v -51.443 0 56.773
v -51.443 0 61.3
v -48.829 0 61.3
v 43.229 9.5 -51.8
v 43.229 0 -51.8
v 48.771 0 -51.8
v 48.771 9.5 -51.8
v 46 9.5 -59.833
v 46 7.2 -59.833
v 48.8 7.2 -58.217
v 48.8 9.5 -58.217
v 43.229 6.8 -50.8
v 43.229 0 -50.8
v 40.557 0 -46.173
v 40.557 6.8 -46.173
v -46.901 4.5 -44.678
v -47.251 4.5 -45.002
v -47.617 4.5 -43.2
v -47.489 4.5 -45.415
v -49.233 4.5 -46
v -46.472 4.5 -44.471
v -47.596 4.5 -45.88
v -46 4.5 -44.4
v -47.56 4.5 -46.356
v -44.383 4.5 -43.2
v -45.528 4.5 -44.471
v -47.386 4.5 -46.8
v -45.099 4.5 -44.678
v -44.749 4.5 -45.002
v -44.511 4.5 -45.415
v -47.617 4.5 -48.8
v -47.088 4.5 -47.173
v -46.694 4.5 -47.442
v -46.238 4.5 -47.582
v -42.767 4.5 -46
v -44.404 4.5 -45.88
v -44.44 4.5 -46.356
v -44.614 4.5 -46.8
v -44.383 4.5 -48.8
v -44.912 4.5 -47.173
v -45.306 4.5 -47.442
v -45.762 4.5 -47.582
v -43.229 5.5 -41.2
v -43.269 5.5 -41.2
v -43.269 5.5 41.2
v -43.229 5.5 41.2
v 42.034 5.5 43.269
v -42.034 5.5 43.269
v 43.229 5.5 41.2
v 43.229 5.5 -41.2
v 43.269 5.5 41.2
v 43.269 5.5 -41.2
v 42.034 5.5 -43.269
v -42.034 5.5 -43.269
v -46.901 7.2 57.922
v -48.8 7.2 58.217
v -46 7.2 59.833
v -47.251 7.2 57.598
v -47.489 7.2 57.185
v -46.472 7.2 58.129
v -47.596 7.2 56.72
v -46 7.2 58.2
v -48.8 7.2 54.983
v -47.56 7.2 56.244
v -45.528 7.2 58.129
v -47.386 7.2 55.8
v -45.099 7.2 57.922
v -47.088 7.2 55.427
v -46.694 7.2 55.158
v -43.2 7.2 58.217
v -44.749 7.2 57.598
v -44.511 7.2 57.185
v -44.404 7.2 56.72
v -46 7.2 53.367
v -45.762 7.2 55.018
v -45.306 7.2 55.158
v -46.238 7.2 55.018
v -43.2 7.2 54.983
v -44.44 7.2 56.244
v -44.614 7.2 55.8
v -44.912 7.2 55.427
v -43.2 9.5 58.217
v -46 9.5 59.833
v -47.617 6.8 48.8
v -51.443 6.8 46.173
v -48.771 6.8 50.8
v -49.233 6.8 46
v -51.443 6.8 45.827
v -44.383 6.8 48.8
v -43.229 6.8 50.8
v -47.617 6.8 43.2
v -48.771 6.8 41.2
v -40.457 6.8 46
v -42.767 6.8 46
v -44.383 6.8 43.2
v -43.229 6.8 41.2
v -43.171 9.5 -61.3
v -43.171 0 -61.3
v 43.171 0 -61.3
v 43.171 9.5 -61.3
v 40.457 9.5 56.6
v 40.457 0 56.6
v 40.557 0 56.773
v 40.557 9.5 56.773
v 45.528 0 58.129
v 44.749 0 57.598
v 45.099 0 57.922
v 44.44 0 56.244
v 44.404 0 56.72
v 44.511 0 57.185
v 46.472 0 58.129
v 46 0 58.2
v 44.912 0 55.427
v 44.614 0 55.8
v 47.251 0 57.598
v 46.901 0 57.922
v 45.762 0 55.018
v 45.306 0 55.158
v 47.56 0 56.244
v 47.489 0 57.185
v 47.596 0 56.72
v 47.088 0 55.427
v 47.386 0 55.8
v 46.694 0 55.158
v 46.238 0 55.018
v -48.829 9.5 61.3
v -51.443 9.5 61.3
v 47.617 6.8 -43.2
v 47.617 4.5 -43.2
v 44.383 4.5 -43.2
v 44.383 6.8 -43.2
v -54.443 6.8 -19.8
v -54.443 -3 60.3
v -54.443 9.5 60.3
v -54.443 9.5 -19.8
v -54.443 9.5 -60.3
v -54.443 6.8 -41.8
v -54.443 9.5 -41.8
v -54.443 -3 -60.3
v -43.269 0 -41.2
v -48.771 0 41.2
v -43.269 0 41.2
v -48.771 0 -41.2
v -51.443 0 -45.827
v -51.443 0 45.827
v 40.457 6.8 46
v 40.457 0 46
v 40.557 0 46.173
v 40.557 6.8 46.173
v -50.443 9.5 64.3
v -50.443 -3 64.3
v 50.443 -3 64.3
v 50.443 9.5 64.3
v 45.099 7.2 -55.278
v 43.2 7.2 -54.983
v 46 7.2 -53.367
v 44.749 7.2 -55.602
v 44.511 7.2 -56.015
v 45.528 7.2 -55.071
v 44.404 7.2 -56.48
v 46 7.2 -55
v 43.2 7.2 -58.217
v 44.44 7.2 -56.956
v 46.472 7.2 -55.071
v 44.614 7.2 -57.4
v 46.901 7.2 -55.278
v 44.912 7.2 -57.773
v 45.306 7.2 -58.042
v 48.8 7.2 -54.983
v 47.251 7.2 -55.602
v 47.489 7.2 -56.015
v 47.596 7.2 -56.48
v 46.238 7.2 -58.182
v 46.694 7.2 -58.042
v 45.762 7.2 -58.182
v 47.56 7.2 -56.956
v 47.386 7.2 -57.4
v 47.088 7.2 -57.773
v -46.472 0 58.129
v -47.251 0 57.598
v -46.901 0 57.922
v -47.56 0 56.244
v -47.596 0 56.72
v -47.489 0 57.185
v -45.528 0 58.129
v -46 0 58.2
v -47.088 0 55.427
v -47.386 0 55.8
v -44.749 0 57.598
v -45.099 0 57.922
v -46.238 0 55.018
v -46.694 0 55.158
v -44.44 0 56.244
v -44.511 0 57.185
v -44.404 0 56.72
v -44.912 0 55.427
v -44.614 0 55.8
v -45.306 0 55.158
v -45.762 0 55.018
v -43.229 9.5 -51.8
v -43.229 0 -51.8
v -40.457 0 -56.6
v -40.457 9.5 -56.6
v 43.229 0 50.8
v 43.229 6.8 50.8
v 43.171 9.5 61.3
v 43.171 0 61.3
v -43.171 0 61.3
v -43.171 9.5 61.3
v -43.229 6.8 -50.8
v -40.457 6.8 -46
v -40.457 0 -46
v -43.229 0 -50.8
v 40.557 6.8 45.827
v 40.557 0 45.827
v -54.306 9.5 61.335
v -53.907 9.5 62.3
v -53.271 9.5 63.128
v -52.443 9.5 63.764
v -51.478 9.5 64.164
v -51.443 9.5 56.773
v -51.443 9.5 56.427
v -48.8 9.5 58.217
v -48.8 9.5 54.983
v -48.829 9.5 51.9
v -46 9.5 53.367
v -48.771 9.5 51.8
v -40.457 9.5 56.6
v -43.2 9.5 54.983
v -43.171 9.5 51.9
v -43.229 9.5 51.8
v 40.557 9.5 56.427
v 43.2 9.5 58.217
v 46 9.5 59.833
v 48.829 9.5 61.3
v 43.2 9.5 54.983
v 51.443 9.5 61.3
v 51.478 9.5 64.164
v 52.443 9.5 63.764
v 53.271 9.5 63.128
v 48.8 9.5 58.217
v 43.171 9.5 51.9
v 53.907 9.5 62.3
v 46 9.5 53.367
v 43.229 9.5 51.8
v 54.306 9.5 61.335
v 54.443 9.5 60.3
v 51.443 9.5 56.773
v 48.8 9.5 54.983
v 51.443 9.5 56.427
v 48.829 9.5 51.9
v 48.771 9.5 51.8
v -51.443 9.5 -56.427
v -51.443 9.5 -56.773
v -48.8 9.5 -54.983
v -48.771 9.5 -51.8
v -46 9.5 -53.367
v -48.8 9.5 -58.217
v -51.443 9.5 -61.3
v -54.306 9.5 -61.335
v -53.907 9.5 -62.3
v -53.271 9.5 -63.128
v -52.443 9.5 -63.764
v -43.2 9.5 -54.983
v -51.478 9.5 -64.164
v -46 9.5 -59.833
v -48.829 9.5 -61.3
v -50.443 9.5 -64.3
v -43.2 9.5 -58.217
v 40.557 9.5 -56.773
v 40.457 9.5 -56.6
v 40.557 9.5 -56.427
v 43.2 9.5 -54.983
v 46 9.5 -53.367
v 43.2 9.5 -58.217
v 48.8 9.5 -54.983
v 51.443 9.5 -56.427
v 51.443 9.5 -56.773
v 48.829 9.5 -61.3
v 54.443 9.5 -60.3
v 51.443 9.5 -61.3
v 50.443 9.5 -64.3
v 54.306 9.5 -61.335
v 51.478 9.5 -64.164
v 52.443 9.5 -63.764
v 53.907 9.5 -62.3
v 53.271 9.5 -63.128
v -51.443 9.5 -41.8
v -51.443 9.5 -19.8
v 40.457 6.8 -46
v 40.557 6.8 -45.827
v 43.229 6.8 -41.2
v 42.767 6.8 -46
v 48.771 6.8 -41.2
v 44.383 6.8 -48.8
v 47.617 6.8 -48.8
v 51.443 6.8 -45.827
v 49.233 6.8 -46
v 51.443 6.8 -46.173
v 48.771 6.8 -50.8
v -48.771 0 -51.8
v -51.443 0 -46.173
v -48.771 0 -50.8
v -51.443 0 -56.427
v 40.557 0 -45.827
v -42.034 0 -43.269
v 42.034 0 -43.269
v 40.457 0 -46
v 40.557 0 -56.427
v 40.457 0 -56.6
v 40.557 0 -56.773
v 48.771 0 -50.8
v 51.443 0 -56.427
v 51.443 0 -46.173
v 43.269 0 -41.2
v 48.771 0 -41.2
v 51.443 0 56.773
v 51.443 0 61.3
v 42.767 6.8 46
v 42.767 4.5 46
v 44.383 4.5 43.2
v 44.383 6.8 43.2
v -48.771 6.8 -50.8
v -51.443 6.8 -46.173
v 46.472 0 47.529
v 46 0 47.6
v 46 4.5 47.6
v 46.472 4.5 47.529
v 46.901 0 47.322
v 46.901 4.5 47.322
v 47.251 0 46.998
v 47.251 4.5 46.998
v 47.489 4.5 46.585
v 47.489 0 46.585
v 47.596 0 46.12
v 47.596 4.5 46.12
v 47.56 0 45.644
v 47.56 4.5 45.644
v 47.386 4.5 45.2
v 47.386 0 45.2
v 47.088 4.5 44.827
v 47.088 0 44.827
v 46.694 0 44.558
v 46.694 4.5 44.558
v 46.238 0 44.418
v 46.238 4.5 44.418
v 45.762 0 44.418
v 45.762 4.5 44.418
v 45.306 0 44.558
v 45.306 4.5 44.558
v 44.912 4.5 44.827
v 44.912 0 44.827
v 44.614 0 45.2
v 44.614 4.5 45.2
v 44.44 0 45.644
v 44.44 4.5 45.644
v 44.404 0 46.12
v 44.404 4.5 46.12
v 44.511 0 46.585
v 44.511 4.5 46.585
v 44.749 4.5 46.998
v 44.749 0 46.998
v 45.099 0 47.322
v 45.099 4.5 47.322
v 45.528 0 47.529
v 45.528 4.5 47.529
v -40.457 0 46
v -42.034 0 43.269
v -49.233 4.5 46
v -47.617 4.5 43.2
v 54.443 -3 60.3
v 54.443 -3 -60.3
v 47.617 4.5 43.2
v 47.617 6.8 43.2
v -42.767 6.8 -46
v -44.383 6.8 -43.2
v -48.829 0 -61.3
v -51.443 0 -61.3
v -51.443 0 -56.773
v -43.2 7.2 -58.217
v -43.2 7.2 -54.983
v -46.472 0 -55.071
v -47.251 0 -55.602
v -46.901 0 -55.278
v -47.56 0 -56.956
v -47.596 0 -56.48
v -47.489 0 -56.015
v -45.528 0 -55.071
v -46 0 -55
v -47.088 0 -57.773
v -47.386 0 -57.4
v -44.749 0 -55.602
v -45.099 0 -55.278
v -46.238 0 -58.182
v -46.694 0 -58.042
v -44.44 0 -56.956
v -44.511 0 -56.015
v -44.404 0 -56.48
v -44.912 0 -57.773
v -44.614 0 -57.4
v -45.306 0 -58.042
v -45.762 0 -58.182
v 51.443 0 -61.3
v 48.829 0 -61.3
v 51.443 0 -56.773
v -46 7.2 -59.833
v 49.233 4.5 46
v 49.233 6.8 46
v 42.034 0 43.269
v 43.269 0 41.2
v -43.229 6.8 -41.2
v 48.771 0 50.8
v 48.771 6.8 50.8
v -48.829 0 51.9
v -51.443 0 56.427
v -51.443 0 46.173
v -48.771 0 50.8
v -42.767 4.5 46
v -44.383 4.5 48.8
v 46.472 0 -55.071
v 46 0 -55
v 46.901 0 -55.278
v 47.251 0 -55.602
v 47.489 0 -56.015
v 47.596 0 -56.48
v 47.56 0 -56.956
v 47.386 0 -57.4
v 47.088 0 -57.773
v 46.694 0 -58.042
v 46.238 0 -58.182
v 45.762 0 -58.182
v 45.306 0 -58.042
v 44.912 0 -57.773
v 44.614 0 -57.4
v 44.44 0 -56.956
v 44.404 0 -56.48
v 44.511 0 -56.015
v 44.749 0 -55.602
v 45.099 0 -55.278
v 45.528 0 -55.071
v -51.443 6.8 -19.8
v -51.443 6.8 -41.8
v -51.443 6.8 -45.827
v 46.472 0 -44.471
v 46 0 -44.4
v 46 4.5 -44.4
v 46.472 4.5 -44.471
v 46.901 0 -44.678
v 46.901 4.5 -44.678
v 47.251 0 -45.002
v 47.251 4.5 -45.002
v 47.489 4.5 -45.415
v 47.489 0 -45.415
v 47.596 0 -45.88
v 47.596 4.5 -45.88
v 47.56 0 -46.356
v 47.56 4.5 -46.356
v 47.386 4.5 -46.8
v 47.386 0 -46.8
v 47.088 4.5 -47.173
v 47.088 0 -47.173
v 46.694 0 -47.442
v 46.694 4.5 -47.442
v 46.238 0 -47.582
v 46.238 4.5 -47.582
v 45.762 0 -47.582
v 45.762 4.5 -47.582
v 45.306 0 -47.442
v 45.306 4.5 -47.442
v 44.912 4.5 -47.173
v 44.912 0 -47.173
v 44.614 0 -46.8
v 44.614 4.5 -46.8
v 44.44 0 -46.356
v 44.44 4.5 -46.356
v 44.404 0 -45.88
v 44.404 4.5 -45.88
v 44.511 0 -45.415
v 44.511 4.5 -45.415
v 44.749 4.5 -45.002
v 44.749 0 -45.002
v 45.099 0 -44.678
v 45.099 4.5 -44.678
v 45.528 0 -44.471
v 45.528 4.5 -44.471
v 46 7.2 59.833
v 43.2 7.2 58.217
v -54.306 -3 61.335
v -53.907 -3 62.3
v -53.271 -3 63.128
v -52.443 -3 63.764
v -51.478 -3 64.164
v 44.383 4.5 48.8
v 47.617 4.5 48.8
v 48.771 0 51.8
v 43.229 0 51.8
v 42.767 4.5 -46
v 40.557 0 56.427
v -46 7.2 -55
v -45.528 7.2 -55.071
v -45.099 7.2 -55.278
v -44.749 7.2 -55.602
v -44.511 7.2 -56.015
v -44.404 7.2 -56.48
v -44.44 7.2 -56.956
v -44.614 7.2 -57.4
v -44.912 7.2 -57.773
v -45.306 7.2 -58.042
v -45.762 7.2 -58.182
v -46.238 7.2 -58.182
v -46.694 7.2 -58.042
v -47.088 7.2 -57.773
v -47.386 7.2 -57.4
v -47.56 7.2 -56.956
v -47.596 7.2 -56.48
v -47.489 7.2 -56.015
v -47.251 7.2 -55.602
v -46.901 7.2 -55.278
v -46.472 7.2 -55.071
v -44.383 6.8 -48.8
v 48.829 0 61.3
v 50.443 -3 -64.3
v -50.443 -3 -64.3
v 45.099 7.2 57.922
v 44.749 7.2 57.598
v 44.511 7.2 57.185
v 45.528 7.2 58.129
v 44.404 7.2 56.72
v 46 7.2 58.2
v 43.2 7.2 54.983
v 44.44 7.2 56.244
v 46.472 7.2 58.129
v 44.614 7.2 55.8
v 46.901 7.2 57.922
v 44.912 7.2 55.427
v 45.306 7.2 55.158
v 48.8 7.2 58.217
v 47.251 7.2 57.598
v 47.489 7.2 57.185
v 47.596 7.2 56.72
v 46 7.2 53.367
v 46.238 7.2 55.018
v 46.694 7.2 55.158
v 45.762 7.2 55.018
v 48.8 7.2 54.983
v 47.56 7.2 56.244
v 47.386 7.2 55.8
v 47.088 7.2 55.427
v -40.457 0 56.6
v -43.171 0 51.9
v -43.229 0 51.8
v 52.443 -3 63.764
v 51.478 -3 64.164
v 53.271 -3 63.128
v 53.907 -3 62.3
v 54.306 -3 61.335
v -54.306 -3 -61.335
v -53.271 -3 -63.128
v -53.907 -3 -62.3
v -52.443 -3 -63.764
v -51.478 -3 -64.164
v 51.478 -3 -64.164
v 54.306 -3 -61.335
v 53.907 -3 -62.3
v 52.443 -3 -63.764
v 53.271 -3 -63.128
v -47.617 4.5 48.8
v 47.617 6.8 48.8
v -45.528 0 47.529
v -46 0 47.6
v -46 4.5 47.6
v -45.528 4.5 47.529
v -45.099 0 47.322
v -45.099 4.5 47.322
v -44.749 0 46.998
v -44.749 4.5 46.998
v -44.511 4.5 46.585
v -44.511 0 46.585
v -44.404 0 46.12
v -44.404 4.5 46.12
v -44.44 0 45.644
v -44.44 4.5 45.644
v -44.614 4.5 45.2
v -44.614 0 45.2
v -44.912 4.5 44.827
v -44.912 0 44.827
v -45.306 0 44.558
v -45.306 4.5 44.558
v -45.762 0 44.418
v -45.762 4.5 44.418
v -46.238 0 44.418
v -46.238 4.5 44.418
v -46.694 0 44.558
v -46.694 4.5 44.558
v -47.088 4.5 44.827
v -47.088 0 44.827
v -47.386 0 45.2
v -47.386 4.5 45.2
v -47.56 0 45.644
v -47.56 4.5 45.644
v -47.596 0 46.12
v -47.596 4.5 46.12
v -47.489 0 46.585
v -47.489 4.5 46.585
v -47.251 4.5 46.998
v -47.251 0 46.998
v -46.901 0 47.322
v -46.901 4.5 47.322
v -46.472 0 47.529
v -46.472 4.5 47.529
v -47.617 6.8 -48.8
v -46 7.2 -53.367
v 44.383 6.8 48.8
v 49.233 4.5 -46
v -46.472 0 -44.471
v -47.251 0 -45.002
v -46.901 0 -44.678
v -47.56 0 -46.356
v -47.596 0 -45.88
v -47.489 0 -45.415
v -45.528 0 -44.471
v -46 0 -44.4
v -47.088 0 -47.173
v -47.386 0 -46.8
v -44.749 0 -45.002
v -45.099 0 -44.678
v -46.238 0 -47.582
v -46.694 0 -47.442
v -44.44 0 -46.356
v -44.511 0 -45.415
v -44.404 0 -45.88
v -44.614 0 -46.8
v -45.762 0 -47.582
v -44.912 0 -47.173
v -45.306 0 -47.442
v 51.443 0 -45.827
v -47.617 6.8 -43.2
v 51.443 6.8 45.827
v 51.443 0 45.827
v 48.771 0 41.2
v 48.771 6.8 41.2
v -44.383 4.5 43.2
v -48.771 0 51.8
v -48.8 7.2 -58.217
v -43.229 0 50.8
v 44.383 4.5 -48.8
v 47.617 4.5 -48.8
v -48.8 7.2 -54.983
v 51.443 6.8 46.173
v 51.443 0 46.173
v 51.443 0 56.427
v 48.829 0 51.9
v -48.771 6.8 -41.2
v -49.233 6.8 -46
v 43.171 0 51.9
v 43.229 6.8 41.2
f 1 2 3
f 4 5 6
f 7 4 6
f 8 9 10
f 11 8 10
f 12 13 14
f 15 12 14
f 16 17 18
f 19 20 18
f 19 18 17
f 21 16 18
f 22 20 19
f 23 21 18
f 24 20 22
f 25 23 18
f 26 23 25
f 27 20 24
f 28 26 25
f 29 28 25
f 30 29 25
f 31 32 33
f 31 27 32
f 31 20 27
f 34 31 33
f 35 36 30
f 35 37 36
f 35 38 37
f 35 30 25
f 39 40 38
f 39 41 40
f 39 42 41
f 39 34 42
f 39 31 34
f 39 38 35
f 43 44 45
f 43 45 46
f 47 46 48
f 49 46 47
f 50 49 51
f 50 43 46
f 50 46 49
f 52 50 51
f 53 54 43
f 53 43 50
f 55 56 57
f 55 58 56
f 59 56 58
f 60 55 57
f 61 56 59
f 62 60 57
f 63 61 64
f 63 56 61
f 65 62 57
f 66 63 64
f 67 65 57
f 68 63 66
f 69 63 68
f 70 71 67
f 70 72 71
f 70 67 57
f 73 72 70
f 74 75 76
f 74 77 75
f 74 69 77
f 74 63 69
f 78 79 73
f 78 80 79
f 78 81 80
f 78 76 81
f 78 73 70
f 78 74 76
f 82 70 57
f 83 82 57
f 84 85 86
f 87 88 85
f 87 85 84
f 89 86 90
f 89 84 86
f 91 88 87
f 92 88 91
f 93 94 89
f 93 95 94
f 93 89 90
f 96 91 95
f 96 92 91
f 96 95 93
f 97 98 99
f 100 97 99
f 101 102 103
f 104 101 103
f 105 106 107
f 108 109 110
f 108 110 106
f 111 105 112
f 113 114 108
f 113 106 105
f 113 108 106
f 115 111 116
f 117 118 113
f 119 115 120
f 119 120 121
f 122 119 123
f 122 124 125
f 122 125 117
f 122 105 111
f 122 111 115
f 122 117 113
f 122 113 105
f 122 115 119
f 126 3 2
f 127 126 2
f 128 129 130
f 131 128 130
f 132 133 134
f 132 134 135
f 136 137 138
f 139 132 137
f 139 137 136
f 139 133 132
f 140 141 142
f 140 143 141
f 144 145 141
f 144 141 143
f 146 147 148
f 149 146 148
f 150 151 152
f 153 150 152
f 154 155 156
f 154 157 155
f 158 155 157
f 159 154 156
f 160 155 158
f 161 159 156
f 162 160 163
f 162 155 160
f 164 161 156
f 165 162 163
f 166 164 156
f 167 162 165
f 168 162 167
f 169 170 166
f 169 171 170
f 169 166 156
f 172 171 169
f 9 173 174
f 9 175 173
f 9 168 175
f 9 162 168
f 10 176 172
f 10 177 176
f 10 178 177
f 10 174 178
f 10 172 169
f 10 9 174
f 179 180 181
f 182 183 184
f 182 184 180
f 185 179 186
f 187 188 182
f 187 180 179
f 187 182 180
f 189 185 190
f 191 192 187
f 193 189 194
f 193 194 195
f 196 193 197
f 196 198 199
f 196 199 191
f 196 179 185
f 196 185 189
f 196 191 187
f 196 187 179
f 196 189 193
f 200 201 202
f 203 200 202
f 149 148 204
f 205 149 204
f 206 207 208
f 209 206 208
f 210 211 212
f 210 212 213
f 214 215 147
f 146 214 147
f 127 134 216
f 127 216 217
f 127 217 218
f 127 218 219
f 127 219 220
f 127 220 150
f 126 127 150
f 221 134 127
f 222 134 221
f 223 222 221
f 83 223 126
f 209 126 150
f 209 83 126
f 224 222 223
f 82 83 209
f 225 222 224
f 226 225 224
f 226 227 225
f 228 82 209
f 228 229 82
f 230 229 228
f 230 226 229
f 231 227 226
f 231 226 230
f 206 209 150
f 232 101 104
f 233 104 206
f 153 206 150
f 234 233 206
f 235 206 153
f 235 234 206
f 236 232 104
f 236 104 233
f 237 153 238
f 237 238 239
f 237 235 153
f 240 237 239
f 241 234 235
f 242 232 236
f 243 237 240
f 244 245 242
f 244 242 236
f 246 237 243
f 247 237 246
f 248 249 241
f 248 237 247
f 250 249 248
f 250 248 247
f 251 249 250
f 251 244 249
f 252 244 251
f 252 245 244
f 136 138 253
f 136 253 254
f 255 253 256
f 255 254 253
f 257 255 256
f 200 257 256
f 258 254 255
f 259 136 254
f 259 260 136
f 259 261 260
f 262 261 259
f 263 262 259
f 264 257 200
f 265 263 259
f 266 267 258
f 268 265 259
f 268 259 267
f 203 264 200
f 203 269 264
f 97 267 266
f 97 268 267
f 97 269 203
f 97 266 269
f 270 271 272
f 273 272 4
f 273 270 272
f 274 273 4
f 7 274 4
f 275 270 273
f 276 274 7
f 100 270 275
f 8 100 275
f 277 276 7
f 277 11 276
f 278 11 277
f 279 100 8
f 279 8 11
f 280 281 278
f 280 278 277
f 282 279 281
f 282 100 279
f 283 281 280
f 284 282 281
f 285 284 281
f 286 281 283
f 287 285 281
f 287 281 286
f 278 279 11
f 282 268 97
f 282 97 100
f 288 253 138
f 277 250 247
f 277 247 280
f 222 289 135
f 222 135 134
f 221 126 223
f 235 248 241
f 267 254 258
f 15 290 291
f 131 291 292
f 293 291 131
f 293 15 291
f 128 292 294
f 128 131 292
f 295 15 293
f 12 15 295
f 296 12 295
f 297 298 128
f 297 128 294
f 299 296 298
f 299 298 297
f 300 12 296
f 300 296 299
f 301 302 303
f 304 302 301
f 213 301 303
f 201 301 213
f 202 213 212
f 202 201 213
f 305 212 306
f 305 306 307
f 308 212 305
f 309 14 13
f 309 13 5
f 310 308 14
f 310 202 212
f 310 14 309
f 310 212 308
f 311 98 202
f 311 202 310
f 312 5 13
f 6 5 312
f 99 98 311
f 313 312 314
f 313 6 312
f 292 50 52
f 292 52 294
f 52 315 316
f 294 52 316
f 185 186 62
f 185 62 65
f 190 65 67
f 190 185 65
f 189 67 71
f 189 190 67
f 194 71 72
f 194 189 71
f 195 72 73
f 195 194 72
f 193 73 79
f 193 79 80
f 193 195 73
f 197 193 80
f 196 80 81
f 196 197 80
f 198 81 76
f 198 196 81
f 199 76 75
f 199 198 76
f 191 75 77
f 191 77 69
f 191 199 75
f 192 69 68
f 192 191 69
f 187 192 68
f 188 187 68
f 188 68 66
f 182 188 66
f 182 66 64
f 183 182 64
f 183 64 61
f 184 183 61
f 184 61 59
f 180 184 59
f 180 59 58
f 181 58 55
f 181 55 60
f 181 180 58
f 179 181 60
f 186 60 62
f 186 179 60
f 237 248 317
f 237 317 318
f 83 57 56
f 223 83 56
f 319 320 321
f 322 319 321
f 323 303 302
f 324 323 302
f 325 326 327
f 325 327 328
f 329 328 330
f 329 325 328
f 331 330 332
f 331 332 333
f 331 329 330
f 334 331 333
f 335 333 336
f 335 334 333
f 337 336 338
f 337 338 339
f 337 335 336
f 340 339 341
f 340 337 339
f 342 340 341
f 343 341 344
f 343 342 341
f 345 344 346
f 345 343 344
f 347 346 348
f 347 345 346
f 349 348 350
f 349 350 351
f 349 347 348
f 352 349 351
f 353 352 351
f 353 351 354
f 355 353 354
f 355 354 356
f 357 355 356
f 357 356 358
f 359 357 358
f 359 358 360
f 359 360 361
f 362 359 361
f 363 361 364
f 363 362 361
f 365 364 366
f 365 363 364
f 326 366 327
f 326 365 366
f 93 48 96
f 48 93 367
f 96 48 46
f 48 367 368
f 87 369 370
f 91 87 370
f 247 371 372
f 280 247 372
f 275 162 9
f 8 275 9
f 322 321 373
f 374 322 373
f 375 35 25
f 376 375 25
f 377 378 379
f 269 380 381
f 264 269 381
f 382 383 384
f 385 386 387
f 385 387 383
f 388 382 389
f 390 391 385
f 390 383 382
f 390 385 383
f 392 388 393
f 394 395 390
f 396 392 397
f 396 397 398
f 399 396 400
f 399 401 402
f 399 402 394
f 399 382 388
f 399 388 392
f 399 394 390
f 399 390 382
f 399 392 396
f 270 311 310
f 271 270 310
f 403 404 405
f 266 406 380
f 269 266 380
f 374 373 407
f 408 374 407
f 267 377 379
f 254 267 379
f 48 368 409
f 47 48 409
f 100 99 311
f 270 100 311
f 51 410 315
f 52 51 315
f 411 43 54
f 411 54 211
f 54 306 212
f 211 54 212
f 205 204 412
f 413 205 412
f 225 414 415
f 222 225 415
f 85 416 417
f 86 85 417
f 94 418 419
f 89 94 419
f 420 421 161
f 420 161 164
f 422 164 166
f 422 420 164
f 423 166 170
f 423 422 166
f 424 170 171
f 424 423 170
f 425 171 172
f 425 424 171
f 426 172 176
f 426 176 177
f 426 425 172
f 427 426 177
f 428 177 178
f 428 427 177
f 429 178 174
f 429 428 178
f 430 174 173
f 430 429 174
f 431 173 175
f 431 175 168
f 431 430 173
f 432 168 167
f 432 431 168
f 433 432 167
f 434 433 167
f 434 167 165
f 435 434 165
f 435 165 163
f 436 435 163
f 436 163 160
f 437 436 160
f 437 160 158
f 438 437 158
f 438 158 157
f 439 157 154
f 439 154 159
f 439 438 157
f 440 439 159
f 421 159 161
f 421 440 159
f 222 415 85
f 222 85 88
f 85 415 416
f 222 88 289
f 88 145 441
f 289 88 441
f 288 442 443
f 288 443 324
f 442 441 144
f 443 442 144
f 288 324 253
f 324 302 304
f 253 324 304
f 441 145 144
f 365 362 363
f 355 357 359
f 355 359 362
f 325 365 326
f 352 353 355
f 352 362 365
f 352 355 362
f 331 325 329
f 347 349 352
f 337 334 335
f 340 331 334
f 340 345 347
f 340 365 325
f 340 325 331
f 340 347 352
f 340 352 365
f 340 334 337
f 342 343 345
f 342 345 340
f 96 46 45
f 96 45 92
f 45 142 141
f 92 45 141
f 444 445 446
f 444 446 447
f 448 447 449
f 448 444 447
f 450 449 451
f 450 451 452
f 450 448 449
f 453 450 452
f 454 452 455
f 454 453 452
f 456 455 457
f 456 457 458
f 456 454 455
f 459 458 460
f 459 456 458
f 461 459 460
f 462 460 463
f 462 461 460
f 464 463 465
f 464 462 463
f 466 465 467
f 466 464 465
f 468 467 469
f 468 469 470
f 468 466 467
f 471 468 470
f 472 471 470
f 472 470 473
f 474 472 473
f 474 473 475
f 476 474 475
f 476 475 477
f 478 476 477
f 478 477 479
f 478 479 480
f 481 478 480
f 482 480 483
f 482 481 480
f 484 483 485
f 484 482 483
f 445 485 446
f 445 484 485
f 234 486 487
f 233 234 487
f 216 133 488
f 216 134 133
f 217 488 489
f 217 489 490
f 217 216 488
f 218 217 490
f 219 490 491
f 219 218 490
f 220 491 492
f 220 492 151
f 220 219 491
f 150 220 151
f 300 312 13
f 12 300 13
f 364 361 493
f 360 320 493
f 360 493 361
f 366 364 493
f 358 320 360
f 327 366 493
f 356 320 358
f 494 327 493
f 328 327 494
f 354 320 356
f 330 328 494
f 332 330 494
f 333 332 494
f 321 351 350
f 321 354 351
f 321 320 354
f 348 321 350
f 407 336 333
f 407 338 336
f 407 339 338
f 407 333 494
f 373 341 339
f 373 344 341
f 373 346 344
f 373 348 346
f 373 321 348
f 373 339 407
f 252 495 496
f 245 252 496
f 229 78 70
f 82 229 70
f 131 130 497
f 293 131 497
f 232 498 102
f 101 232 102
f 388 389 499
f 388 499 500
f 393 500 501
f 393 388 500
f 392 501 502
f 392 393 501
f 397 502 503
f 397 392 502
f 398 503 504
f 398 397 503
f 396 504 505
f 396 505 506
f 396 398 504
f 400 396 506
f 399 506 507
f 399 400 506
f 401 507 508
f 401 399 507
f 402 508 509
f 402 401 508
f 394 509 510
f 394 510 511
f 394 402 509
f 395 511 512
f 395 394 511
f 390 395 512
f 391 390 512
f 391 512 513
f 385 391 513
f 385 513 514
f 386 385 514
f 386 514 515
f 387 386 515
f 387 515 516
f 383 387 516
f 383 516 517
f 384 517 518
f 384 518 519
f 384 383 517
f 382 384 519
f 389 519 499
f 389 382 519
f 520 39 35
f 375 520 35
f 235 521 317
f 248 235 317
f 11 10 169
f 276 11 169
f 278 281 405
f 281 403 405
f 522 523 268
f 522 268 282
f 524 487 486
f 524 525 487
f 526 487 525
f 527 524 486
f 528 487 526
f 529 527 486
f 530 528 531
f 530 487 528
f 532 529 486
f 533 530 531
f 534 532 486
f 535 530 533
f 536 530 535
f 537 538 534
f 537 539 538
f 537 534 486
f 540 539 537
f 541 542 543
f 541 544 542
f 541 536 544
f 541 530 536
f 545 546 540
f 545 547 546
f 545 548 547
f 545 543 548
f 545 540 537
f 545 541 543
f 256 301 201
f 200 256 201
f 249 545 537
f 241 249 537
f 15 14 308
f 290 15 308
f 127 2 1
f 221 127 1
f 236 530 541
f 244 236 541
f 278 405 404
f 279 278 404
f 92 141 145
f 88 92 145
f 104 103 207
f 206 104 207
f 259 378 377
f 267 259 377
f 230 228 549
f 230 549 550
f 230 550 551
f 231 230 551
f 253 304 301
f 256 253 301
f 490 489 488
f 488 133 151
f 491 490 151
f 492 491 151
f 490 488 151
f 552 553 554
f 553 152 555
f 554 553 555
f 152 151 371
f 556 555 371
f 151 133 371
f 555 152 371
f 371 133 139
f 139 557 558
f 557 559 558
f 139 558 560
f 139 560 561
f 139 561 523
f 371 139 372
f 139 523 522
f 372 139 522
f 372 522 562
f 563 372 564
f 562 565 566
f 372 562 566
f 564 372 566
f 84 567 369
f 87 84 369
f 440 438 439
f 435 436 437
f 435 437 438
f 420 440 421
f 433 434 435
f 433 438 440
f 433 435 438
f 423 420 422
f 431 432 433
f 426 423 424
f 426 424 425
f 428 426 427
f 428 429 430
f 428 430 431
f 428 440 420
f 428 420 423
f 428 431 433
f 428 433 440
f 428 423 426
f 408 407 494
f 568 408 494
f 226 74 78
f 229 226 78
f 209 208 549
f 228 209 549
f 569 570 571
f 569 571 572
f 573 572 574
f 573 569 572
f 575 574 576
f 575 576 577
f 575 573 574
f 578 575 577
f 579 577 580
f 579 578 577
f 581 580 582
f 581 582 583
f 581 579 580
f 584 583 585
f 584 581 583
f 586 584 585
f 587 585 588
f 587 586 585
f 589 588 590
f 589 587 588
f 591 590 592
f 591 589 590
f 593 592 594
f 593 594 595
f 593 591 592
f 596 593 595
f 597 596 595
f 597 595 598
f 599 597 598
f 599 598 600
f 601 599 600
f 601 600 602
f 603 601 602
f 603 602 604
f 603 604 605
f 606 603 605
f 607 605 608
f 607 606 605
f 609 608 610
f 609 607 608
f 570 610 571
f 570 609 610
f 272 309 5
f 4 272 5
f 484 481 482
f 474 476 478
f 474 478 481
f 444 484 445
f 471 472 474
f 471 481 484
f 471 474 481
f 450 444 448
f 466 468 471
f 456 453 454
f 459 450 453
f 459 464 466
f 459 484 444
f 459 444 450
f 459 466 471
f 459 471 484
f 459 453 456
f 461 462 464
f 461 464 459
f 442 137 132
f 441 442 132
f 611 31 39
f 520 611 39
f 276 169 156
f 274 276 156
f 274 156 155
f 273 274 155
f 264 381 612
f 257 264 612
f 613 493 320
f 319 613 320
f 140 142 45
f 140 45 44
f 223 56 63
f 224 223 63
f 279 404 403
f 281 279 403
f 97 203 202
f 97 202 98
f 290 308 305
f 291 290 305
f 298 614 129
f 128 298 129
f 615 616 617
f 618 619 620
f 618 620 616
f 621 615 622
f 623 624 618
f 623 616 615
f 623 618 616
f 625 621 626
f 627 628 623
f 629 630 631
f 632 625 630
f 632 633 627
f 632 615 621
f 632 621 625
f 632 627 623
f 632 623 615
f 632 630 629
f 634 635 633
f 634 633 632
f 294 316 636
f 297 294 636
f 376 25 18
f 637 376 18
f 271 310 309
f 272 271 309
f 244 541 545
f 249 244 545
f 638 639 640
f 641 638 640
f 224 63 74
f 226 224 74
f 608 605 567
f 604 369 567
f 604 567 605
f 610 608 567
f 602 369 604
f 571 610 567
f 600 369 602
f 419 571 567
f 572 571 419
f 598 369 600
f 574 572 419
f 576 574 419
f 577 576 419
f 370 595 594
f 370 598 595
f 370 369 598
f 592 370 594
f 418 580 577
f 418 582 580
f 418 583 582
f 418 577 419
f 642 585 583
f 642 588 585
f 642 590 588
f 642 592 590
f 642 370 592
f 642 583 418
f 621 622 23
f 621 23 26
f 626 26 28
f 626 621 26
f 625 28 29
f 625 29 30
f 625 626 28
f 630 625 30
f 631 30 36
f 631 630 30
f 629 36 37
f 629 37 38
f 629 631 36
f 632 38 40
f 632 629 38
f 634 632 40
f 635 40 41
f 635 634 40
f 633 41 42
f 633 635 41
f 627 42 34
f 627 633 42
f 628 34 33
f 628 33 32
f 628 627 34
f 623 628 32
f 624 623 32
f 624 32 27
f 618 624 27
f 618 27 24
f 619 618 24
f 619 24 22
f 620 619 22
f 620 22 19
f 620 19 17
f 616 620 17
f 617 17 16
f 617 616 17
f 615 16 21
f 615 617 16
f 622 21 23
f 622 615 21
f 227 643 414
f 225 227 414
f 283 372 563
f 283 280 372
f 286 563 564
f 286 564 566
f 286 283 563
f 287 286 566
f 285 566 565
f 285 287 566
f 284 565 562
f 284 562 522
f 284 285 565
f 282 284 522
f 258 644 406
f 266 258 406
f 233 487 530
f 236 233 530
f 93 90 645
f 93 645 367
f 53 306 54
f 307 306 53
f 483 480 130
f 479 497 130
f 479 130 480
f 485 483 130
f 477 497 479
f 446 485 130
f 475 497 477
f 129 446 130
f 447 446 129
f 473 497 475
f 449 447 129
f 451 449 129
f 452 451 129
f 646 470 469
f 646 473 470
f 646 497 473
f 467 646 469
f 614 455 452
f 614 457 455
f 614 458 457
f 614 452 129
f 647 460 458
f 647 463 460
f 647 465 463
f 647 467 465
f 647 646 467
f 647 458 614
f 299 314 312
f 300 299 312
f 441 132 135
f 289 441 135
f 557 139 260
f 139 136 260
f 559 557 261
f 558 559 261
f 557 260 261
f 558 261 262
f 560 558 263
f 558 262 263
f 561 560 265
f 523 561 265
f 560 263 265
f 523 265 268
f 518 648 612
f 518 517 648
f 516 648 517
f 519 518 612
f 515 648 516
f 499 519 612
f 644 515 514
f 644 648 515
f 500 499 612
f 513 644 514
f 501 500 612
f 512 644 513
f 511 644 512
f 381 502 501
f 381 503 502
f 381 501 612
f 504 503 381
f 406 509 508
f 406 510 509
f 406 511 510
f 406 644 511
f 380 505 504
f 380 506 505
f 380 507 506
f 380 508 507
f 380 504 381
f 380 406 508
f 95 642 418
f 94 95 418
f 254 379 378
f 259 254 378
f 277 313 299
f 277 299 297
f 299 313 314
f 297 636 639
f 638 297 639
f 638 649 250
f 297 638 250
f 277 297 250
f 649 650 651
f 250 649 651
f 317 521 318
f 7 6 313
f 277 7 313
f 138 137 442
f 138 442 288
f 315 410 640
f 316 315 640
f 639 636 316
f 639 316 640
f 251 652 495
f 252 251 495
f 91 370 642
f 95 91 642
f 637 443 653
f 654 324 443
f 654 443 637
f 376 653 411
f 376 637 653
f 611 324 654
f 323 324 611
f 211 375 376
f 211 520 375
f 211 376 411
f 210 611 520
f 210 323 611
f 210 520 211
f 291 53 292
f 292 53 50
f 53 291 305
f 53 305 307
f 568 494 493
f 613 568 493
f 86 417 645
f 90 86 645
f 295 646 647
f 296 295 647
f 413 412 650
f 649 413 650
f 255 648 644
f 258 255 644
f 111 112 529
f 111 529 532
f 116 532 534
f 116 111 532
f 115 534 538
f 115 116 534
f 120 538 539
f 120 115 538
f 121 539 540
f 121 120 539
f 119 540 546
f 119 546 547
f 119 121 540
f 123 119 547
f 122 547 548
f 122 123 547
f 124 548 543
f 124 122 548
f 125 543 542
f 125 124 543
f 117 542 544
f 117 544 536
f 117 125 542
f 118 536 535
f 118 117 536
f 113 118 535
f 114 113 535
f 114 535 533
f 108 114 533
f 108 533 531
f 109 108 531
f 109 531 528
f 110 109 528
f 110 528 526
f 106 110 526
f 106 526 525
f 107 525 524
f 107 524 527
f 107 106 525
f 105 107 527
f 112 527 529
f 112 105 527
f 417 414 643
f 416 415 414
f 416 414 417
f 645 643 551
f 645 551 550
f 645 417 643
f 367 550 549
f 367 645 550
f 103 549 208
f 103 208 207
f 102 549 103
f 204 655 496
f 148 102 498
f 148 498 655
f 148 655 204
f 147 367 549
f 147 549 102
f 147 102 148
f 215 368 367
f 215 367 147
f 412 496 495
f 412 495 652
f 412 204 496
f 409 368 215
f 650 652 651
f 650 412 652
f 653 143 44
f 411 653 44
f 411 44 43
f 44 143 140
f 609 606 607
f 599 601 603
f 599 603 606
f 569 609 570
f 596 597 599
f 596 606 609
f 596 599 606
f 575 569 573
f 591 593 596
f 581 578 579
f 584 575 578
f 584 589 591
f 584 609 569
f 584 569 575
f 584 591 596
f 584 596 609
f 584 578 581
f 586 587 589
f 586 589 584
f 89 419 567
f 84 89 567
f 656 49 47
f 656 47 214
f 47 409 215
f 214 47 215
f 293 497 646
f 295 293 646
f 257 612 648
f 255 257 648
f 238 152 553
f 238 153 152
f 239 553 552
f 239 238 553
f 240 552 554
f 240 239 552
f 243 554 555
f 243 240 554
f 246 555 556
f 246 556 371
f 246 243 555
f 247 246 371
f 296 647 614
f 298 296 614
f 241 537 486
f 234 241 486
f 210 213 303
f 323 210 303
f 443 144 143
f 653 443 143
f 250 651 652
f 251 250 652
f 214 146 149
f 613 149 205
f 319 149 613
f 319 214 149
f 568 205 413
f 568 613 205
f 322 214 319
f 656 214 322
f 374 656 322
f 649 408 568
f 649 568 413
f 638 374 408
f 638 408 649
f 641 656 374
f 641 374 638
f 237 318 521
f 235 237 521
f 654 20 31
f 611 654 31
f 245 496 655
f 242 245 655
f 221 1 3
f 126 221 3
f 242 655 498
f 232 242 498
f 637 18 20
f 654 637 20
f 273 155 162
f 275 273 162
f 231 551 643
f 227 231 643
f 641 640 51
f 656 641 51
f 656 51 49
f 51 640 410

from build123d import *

# Parameters (mm, degrees)
P_IDAT_VYSUNUT_M25_DEPTH      = 3
P_IDAT_VYSUNUT_M26_DEPTH      = 9.5
P_IDAT_VYSUNUT_M26_DEPTH_BACK = 3
SKICA1_21_W                   = 108.885125168
SKICA1_21_H                   = 128.6
SKICA1_21_W_2                 = 102.885125168
SKICA1_21_H_2                 = 122.6
P_IDAT_VYSUNUT_M28_DEPTH      = 6.8
SKICA1_24_R                   = 1.6
P_IDAT_VYSUNUT_M29_DEPTH      = 4.5
LINPOLE3_COUNT                = 2
LINPOLE3_PITCH                = 92
LINPOLE3_COUNT_DIR2           = 2
LINPOLE3_PITCH_DIR2           = 92
P_IDAT_VYSUNUT_M30_DEPTH      = 9.5
SKICA1_26_R                   = 1.6
P_IDAT_VYSUNUT_M31_DEPTH      = 7.2
LINPOLE4_COUNT                = 2
LINPOLE4_PITCH                = 92
LINPOLE4_COUNT_DIR2           = 2
LINPOLE4_PITCH_DIR2           = 113.2
SKICA8_W                      = 86.538297386
SKICA8_H                      = 86.538297386
P_IDAT_VYSUNUT_M32_DEPTH      = 5.5
ZAOBLIT4_R                    = 4
SKICA9_W                      = 22
SKICA9_H                      = 2.7
ODEBRAT_VYSUNUT_M1_DEPTH      = 10


with BuildPart() as part:
    # Skica1 → Přidat vysunutím25 (new body)
    with BuildSketch(Plane(origin=(0, 0, 0), x_dir=(1, 0, 0), z_dir=(0, 1, 0))):
        Polygon((51.442562584, 61.3), (-43.170983681, 61.3), (-43.228718708, 61.4), (-48.771281292, 61.4), (-48.829016319, 61.3), (-51.442562584, 61.3), (-51.442562584, 56.773205081), (-51.542562584, 56.6), (-51.442562584, 56.426794919), (-51.442562584, 46.173205081), (-51.542562584, 46), (-51.442562584, 45.826794919), (-51.442562584, -61.3), (51.442562584, -61.3), align=None)
    extrude(amount=-P_IDAT_VYSUNUT_M25_DEPTH)

    # Skica1<21> → Přidat vysunutím26 (add, two sides: drawn at the far end of the back side and taken through both)
    with BuildSketch(Plane(origin=(0, 0, 0), x_dir=(1, 0, 0), z_dir=(0, 1, 0)).offset(-P_IDAT_VYSUNUT_M26_DEPTH_BACK)):
        Rectangle(SKICA1_21_W, SKICA1_21_H)
        Rectangle(SKICA1_21_W_2, SKICA1_21_H_2, mode=Mode.SUBTRACT)
    extrude(amount=P_IDAT_VYSUNUT_M26_DEPTH + P_IDAT_VYSUNUT_M26_DEPTH_BACK)

    # Skica1<23> → Přidat vysunutím28 (add)
    with BuildSketch(Plane(origin=(0, 0, 0), x_dir=(1, 0, 0), z_dir=(0, 1, 0))):
        Polygon((-48.771281292, 41.2), (-43.228718708, 41.2), (-40.457437416, 46), (-43.228718708, 50.8), (-48.771281292, 50.8), (-51.542562584, 46), align=None)
        Polygon((-44.383419246, 43.2), (-47.616580754, 43.2), (-49.233161507, 46), (-47.616580754, 48.8), (-44.383419246, 48.8), (-42.766838493, 46), align=None, mode=Mode.SUBTRACT)
    p_idat_vysunut_m28 = extrude(amount=P_IDAT_VYSUNUT_M28_DEPTH)

    # Skica1<24> → Přidat vysunutím29 (add)
    with BuildSketch(Plane(origin=(0, 0, 0), x_dir=(1, 0, 0), z_dir=(0, 1, 0))):
        Polygon((-49.233161507, 46), (-47.616580754, 43.2), (-44.383419246, 43.2), (-42.766838493, 46), (-44.383419246, 48.8), (-47.616580754, 48.8), align=None)
        with Locations((-46, 46)):
            Circle(SKICA1_24_R, mode=Mode.SUBTRACT)
    p_idat_vysunut_m29 = extrude(amount=P_IDAT_VYSUNUT_M29_DEPTH)

    # LinPole3: Přidat vysunutím28, P_idat vysunut_m29 2 × 2
    with Locations(*[(i * LINPOLE3_PITCH, 0, j * LINPOLE3_PITCH_DIR2) for i in range(LINPOLE3_COUNT) for j in range(LINPOLE3_COUNT_DIR2) if (i, j) != (0, 0)]):
        add(p_idat_vysunut_m28)
        add(p_idat_vysunut_m29)

    # Skica1<25> → Přidat vysunutím30 (add)
    with BuildSketch(Plane(origin=(0, 0, 0), x_dir=(1, 0, 0), z_dir=(0, 1, 0))):
        Polygon((-51.542562584, 56.6), (-48.771281292, 51.8), (-43.228718708, 51.8), (-40.457437416, 56.6), (-43.228718708, 61.4), (-48.771281292, 61.4), align=None)
        Polygon((-43.2, 54.983419246), (-46, 53.366838493), (-48.8, 54.983419246), (-48.8, 58.216580754), (-46, 59.833161507), (-43.2, 58.216580754), align=None, mode=Mode.SUBTRACT)
    p_idat_vysunut_m30 = extrude(amount=P_IDAT_VYSUNUT_M30_DEPTH)

    # Skica1<26> → Přidat vysunutím31 (add)
    with BuildSketch(Plane(origin=(0, 0, 0), x_dir=(1, 0, 0), z_dir=(0, 1, 0))):
        Polygon((-48.8, 54.983419246), (-46, 53.366838493), (-43.2, 54.983419246), (-43.2, 58.216580754), (-46, 59.833161507), (-48.8, 58.216580754), align=None)
        with Locations((-46, 56.6)):
            Circle(SKICA1_26_R, mode=Mode.SUBTRACT)
    p_idat_vysunut_m31 = extrude(amount=P_IDAT_VYSUNUT_M31_DEPTH)

    # LinPole4: Přidat vysunutím30, P_idat vysunut_m31 2 × 2
    with Locations(*[(i * LINPOLE4_PITCH, 0, j * LINPOLE4_PITCH_DIR2) for i in range(LINPOLE4_COUNT) for j in range(LINPOLE4_COUNT_DIR2) if (i, j) != (0, 0)]):
        add(p_idat_vysunut_m30)
        add(p_idat_vysunut_m31)

    # Skica8 → Přidat vysunutím32 (add)
    with BuildSketch(Plane(origin=(0, 0, 0), x_dir=(1, 0, 0), z_dir=(0, 1, 0))):
        Rectangle(SKICA8_W, SKICA8_H)
    extrude(amount=P_IDAT_VYSUNUT_M32_DEPTH)

    # Zaoblit4
    zaoblit4_edges = [part.edges().sort_by_distance(p)[0] for p in [
        (-54.442562584, 3.25, 64.3),
        (54.442562584, 3.25, 64.3),
        (54.442562584, 3.25, -64.3),
        (-54.442562584, 3.25, -64.3),
    ]]
    fillet(zaoblit4_edges, radius=ZAOBLIT4_R)

    # Skica9 → Odebrat vysunutím1 (cut)
    with BuildSketch(Plane.ZY.offset(54.442562584)):
        with Locations((-30.8, 8.15)):
            Rectangle(SKICA9_W, SKICA9_H)
    extrude(amount=-ODEBRAT_VYSUNUT_M1_DEPTH, mode=Mode.SUBTRACT)


solid = part.part
